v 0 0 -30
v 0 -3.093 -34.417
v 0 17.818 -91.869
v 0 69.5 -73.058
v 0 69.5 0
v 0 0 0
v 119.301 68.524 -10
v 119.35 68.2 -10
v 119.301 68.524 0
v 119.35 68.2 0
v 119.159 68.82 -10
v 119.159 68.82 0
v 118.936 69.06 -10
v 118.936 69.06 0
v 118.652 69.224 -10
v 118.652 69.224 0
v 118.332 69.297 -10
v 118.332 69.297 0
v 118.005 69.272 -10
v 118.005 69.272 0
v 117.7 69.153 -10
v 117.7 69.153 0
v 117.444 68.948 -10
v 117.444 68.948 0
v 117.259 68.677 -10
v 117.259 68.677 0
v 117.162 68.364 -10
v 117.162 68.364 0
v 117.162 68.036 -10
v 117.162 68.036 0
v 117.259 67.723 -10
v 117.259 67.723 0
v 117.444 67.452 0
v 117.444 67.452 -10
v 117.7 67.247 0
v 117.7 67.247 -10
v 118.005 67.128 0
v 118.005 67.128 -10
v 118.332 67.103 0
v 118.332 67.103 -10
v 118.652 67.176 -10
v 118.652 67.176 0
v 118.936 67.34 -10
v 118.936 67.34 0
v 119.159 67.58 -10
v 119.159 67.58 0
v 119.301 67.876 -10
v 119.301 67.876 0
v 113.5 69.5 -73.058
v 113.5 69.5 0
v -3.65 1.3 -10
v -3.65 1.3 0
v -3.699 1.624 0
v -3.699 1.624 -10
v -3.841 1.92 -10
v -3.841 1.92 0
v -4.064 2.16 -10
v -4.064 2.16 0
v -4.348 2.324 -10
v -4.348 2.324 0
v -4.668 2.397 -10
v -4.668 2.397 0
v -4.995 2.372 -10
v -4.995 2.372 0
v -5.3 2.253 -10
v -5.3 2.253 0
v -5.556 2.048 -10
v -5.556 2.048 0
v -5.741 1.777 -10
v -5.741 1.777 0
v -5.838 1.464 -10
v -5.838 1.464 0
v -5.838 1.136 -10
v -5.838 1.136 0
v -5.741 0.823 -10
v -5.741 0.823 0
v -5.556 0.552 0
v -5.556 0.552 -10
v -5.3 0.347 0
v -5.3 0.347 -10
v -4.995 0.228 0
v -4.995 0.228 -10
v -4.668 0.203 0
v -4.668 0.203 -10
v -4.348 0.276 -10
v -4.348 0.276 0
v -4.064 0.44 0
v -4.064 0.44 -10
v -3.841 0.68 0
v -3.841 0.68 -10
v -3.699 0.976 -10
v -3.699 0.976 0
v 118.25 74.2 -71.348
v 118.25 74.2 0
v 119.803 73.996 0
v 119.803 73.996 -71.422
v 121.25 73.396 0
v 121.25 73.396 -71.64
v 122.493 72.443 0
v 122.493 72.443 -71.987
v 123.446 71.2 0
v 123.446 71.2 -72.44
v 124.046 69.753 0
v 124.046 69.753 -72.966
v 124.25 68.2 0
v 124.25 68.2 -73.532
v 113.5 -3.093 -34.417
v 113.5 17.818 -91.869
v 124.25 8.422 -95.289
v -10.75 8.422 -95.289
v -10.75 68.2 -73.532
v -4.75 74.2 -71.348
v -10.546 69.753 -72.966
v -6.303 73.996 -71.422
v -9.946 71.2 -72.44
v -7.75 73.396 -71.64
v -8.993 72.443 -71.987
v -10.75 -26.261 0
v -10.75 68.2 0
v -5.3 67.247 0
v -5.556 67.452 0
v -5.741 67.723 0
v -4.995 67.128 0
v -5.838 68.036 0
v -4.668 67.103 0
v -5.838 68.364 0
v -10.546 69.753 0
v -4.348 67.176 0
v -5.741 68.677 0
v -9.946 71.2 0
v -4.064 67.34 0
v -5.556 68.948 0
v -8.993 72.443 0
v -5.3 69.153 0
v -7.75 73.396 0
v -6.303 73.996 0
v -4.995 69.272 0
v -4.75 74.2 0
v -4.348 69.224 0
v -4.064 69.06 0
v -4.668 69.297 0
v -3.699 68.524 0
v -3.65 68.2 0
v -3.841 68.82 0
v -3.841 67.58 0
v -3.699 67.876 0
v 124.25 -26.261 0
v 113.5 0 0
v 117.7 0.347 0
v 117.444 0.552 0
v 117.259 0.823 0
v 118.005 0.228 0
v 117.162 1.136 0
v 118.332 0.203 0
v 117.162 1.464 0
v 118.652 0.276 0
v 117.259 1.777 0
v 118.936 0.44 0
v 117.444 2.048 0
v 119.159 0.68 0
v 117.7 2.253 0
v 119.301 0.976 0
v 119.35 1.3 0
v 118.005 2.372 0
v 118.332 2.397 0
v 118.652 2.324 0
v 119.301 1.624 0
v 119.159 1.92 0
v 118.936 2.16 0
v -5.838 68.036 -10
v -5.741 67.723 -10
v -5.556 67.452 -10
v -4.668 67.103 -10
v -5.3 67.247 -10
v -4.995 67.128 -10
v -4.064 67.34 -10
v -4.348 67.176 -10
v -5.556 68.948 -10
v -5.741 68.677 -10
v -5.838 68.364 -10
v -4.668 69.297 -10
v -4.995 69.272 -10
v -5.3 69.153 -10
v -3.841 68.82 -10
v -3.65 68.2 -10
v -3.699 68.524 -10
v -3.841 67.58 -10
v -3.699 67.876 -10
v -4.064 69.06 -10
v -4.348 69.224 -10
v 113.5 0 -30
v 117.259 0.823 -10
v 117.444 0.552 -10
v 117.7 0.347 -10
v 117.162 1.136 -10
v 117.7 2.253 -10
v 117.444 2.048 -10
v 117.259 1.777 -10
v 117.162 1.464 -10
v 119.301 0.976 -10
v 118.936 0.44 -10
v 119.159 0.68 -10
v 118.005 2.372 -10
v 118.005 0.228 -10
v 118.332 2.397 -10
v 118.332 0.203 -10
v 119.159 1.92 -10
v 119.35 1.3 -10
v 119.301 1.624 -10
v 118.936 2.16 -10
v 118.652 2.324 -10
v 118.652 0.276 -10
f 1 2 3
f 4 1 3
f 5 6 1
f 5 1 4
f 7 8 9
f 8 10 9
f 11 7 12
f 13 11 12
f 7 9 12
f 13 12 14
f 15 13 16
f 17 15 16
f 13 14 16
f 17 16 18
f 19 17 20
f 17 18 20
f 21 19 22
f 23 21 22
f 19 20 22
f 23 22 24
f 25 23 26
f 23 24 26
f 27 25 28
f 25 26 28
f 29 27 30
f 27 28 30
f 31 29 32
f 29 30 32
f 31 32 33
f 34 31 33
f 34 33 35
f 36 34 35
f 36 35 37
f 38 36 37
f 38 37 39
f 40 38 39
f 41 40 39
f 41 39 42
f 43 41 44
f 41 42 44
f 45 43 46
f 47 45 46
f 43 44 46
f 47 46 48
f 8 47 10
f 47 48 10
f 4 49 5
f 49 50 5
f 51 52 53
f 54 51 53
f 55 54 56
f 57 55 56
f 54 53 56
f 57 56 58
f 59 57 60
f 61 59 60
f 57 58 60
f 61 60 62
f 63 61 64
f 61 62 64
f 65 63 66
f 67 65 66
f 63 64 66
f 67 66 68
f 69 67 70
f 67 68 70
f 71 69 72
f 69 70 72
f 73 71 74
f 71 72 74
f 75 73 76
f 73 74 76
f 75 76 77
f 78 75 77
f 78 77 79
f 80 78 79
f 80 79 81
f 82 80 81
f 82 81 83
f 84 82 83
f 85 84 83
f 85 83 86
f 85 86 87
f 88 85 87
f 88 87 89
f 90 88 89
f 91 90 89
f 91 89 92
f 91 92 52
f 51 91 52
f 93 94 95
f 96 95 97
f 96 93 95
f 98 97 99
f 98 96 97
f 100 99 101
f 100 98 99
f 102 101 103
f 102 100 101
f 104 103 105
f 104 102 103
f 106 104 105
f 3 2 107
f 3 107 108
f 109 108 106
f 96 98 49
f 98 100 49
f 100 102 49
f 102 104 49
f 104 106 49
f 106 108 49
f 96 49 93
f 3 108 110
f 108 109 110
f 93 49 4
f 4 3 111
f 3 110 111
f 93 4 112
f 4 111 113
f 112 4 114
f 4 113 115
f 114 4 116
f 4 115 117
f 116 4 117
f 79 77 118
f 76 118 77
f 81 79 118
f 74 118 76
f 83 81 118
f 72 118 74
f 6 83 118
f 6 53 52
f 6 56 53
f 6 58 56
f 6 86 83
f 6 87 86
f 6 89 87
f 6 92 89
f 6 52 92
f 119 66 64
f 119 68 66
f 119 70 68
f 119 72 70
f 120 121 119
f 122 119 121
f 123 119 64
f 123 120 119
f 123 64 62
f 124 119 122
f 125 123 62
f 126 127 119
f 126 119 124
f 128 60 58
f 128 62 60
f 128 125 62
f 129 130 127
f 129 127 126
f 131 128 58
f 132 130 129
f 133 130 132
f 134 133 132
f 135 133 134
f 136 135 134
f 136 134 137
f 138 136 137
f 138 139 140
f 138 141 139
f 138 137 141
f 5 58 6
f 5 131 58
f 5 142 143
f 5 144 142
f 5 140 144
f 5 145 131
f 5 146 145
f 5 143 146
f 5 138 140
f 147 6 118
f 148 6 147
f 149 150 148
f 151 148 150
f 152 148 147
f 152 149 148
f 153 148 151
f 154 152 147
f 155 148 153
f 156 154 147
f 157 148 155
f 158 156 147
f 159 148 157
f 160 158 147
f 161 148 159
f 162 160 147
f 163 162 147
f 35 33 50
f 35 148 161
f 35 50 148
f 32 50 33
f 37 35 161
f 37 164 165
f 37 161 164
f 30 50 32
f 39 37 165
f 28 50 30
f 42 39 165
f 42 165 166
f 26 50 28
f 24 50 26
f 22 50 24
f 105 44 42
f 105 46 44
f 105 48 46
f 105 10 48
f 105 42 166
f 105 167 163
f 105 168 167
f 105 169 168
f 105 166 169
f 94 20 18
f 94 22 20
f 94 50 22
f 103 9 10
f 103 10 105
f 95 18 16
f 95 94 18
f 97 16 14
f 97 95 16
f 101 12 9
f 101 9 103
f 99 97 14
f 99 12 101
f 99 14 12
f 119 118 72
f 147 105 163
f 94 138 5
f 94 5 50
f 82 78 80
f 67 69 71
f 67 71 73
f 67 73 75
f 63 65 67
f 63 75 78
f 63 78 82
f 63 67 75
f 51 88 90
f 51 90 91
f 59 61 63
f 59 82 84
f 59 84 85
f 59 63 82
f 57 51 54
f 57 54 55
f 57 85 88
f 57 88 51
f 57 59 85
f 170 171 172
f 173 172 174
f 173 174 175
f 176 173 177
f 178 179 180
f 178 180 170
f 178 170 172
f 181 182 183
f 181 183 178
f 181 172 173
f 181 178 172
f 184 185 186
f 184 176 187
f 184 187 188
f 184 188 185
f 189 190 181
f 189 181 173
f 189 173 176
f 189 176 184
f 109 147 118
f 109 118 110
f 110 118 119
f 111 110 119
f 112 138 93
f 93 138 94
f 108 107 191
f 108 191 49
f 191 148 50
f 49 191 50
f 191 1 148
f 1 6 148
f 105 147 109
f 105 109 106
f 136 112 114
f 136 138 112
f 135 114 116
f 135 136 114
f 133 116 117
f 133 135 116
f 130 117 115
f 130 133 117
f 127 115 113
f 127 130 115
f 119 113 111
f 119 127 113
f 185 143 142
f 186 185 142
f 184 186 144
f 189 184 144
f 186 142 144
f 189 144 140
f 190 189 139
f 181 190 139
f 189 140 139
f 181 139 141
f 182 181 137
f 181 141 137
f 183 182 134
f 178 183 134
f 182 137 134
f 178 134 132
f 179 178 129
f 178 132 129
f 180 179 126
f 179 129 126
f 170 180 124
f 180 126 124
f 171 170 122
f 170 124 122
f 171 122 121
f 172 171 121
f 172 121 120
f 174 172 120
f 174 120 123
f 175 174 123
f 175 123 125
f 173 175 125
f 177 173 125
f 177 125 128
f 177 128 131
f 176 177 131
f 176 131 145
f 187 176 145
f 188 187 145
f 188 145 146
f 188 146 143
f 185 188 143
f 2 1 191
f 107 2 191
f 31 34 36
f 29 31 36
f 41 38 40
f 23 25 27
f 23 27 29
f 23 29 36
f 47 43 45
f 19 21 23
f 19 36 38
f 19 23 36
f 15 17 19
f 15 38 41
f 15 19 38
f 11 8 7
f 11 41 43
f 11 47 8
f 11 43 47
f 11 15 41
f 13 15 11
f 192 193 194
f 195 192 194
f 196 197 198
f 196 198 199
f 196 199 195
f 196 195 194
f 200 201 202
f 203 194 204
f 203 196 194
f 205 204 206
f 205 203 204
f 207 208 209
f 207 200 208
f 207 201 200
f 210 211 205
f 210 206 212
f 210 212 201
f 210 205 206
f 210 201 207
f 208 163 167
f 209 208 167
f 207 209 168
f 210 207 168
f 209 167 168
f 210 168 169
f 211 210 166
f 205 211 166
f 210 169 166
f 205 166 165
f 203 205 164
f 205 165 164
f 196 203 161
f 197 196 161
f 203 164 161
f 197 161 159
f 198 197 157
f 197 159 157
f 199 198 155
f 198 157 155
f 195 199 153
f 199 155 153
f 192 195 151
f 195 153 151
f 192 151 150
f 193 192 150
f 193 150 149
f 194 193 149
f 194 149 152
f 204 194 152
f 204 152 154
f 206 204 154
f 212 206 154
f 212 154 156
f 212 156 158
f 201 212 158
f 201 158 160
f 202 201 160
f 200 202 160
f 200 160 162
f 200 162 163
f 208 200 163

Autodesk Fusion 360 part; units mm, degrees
sketch "Sketch1" plane through (0, 0, 0) normal (0, 0, 1) x (1, 0, 0)
  line L0 (0, 0) -> (113.5, 0)
  line L1 (113.5, 0) -> (113.5, 69.5)
  line L2 (113.5, 69.5) -> (0, 69.5)
  line L3 (0, 69.5) -> (0, 0)
  line L4 (56.75, 69.5) -> (56.75, 0) construction
  line L5 (0, 34.75) -> (113.5, 34.75) construction
  line L6 (-10.75, 74.2) -> (124.25, 74.2)
  line L7 (124.25, 74.2) -> (124.25, -4.7)
  line L8 (124.25, -4.7) -> (-10.75, -4.7)
  line L9 (-10.75, -4.7) -> (-10.75, 74.2)
  line L10 (56.75, 74.2) -> (56.75, -4.7) construction
  line L11 (-10.75, 34.75) -> (124.25, 34.75) construction
  circle A0 centre (-4.75, 68.2) radius 1.1
  circle A1 centre (-4.75, 1.3) radius 1.1
  circle A2 centre (118.25, 1.3) radius 1.1
  circle A3 centre (118.25, 68.2) radius 1.1
  dimension "d1" = 113.5
  dimension "d2" = 69.5
  dimension "d3" = 78.9
  dimension "d4" = 135
  dimension "d5" = 2.2
  dimension "d6" = 2.2
  dimension "d7" = 2.2
  dimension "d8" = 2.2
  dimension "d9" = 6
  dimension "d10" = 6
  dimension "d11" = 6
  dimension "d12" = 6
  dimension "d13" = 6
  dimension "d14" = 6
  dimension "d15" = 6
  dimension "d16" = 6
extrude "Extrude1" add sketch "Sketch1" against normal blind 30 contours L6 L7 L8 L9 | A0 | A1 | A2 | A3
sketch "Sketch2" plane through (124.25, 0, 0) normal (1, 0, 0) x (0, 1, 0)
  line L0 (74.2, 0) -> (-4.7, 0)
  line L1 (-4.7, 0) -> (-4.7, -30)
  line L2 (-4.7, -30) -> (74.2, -30)
  line L3 (74.2, -30) -> (74.2, 0)
  line L4 (-26.2609, 0) -> (74.2, 0)
  line L5 (-26.2609, 0) -> (8.4215, -95.2891)
  line L6 (8.4215, -95.2891) -> (74.2, -71.3477)
  line L7 (74.2, -71.3477) -> (74.2, 0)
  line L8 (-15.6191, 0) -> (17.8184, -91.8689)
  line L9 (-4.7, 0) -> (-4.7, -30)
  line L10 (69.5, 0) -> (69.5, -73.0584)
  point P0 (69.5, -30)
  point P1 (0, -30)
  dimension "d19" = 70
  dimension "d20" = 10
  dimension "d21" = 70
  dimension "d22" = 90
extrude "Extrude2" add sketch "Sketch2" against normal blind 135 contours L2 L6 L7 L10 | L1 L4 L8 L9 | L4 L5 L6 L8
extrude "Extrude3" add sketch "Sketch2" against normal blind 10.75 contours L2 L6 L8 L10
extrude "Extrude4" add sketch "Sketch2" along normal blind 10.75 from surface at -135 contours L2 L6 L8 L10
chamfer "Chamfer1" distance 4.7 angle 45 1 edges at (56.75, -4.7, -30)
extrude "Extrude5" cut sketch "Sketch1" against normal blind 10 contours A0 | A1 | A2 | A3
fillet "Fillet1" radius 6 2 edges at (124.25, 74.2, -35.6739) (-10.75, 74.2, -35.6739)
